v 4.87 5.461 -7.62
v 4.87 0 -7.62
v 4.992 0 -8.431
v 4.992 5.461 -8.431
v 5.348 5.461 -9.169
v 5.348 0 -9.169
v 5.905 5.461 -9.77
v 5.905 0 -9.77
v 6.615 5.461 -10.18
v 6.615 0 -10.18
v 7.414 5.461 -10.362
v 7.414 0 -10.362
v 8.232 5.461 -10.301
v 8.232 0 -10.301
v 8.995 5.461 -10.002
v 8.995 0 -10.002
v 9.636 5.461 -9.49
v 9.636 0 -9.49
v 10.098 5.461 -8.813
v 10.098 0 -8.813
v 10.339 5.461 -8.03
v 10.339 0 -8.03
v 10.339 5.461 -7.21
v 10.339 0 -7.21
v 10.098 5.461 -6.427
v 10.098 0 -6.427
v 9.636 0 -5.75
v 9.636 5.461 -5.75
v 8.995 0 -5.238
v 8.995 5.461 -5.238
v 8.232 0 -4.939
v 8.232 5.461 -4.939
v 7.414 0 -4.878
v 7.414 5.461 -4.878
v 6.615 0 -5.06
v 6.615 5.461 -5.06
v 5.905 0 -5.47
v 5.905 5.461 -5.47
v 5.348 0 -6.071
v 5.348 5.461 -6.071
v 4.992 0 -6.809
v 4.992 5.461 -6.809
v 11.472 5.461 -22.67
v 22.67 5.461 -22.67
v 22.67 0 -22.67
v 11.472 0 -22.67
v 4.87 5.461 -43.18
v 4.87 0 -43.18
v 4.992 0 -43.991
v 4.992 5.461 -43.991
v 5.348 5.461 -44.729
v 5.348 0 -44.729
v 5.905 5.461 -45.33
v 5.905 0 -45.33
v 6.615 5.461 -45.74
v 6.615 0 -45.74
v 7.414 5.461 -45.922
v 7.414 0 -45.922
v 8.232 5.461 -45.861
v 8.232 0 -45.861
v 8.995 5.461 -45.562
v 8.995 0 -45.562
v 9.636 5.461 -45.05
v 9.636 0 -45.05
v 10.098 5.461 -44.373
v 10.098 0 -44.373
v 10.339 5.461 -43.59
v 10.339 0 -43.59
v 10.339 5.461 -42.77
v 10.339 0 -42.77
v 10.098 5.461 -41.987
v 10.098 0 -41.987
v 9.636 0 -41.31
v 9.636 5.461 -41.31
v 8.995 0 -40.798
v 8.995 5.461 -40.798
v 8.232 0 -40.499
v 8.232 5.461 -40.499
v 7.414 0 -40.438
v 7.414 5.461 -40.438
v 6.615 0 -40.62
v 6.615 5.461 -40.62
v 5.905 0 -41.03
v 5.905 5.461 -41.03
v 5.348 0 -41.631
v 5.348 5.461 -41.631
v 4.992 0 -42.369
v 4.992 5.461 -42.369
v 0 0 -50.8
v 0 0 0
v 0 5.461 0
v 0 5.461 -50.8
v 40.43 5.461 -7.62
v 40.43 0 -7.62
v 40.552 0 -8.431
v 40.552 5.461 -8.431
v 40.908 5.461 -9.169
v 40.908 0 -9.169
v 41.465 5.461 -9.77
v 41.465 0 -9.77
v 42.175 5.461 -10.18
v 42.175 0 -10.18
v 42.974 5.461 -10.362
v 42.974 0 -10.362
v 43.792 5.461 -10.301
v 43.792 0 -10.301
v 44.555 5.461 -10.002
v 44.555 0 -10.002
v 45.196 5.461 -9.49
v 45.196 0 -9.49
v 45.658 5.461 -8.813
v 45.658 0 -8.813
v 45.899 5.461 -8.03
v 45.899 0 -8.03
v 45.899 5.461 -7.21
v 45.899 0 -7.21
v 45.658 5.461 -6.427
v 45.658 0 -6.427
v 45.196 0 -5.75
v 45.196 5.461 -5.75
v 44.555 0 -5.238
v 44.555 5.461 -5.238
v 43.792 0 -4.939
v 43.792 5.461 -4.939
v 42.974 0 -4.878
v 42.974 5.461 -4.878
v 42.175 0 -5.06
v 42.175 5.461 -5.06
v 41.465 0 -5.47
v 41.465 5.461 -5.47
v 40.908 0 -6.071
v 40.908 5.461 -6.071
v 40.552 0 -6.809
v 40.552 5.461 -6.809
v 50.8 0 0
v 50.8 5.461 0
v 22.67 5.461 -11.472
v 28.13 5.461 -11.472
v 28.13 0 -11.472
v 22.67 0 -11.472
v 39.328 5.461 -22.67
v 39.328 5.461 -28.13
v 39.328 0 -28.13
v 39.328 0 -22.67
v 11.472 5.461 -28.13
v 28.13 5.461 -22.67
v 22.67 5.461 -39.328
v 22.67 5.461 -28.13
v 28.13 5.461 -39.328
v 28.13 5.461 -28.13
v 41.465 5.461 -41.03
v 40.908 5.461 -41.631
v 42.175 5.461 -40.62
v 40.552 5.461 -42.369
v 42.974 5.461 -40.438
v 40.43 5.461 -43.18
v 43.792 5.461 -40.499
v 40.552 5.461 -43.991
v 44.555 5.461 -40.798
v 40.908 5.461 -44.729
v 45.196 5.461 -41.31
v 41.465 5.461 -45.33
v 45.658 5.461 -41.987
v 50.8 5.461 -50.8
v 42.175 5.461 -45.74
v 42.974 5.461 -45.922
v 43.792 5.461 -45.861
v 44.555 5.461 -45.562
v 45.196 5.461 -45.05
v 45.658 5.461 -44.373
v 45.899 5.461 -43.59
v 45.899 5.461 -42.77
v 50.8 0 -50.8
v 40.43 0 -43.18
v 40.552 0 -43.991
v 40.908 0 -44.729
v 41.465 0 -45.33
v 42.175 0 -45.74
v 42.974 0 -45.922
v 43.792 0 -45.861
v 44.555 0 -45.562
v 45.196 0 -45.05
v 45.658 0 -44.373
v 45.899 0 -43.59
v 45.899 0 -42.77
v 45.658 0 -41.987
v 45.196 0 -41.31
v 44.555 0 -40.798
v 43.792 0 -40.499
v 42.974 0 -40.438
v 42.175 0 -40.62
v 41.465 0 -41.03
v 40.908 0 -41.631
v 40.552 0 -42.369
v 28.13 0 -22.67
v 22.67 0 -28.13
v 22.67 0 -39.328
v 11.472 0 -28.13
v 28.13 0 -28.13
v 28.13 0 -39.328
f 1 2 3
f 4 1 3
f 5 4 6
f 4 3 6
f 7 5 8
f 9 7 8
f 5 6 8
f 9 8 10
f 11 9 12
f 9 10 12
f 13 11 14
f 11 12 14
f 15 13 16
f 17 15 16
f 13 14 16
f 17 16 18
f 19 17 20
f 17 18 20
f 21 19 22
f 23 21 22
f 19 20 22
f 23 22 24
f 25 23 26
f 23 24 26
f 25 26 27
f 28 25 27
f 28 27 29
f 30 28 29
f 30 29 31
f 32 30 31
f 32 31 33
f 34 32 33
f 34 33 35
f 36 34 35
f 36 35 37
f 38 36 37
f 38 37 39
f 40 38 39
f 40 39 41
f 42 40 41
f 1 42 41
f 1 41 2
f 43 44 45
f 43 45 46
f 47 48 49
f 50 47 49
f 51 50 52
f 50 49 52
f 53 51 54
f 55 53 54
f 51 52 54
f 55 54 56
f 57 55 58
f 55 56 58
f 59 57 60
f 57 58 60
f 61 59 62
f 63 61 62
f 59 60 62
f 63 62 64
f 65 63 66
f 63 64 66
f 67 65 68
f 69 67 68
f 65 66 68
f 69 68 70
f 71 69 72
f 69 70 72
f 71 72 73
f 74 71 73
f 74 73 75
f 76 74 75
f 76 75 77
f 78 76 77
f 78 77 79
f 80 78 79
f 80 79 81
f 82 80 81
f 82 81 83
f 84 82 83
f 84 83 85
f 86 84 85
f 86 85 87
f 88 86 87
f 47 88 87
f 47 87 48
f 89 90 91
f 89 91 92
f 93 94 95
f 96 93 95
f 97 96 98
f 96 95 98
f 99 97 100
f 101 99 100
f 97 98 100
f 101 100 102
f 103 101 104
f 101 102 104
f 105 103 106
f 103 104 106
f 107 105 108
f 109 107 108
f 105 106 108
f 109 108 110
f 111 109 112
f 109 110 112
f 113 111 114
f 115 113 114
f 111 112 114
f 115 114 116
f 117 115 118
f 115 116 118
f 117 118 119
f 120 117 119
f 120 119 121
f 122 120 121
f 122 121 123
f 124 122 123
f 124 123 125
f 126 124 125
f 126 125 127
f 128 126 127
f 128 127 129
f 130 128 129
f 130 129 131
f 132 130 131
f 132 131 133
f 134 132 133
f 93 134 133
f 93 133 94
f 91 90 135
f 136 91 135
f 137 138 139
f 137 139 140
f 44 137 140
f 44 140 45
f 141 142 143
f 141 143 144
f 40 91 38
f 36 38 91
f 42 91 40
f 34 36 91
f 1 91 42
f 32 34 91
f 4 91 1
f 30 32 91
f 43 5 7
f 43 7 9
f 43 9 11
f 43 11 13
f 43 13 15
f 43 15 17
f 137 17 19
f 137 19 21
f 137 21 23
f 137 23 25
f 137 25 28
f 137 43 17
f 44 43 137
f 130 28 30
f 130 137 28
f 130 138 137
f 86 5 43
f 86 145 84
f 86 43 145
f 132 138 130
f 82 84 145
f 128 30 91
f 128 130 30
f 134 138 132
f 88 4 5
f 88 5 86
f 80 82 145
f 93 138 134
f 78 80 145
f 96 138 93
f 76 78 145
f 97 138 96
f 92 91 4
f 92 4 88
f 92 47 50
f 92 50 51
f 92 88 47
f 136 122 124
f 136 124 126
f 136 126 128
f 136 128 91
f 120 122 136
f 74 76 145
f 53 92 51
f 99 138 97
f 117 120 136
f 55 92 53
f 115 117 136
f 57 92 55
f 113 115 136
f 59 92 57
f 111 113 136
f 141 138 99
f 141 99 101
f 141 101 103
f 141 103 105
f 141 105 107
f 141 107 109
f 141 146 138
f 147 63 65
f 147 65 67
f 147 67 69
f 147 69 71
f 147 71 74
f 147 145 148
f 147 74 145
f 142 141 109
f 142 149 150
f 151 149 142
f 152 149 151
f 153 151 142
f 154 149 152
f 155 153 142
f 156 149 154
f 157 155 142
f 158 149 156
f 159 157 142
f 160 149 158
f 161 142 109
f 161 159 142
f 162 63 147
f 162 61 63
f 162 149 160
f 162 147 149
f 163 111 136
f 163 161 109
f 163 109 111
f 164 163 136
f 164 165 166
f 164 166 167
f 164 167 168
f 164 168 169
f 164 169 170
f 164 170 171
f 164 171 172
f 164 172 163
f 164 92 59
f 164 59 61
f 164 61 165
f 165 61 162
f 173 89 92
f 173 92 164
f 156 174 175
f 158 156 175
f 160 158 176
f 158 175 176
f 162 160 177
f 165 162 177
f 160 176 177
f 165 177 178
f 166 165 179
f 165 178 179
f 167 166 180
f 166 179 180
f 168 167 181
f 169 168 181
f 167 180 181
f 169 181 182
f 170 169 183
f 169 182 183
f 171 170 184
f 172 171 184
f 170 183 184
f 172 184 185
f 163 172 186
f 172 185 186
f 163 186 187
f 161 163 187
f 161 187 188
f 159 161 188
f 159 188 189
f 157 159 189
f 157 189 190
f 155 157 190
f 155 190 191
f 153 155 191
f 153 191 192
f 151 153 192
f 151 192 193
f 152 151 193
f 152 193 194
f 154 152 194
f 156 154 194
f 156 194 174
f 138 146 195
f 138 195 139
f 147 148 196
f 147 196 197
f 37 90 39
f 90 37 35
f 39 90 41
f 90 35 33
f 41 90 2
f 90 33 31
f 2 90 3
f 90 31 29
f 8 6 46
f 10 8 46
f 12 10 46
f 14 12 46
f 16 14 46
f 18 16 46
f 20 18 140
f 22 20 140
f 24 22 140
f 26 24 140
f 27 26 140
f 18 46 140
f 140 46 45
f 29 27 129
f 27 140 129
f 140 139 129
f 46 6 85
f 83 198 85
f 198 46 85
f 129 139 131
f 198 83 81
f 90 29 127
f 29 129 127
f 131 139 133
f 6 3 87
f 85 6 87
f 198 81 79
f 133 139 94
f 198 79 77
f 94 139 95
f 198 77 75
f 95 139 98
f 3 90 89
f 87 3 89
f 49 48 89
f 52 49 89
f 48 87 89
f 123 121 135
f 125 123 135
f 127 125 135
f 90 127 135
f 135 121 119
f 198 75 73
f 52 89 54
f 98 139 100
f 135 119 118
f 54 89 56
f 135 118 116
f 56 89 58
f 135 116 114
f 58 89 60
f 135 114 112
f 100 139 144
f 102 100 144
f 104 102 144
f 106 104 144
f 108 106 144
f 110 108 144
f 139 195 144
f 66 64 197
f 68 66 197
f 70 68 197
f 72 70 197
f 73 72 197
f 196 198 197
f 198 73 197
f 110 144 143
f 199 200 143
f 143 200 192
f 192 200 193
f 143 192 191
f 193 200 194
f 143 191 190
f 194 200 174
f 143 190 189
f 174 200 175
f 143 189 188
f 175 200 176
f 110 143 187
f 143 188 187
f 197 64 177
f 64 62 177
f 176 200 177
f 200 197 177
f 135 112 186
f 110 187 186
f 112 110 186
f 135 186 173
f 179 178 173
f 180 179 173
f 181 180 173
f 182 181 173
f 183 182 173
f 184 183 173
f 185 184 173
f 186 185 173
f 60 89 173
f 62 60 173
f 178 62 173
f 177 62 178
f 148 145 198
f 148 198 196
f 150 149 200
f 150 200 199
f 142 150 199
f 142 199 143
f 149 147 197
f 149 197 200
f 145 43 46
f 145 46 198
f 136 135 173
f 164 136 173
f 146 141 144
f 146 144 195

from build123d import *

# Parameters (mm, degrees)
SKETCH1_W            = 50.8
SKETCH1_H            = 50.8
BOSS_EXTRUDE1_DEPTH  = 5.461
CUT_EXTRUDE1_DEPTH   = 5.461
M5_CLEARANCE_HOLE1_D = 5.5


with BuildPart() as part:
    # Sketch1 → Boss-Extrude1 (new body)
    with BuildSketch(Plane(origin=(0, 0, 0), x_dir=(1, 0, 0), z_dir=(0, 1, 0))):
        with Locations((25.4, 25.4)):
            Rectangle(SKETCH1_W, SKETCH1_H)
    extrude(amount=BOSS_EXTRUDE1_DEPTH)

    # Sketch2 → Cut-Extrude1 (cut)
    with BuildSketch(Plane(origin=(0, 5.461, 0), x_dir=(1, 0, 0), z_dir=(0, 1, 0))):
        Polygon((28.1305, 28.1305), (39.327666667, 28.1305), (39.327666667, 22.6695), (28.1305, 22.6695), (28.1305, 11.472333333), (22.6695, 11.472333333), (22.6695, 22.6695), (11.472333333, 22.6695), (11.472333333, 28.1305), (22.6695, 28.1305), (22.6695, 39.327666667), (28.1305, 39.327666667), align=None)
    extrude(amount=-CUT_EXTRUDE1_DEPTH, mode=Mode.SUBTRACT)

    # M5 Clearance Hole1 (through all)
    with Locations(Plane(origin=(0, 5.461, 0), x_dir=(1, 0, 0), z_dir=(0, 1, 0))):
        with Locations((7.62, 43.18), (43.18, 43.18), (43.18, 7.62), (7.62, 7.62)):
            Hole(M5_CLEARANCE_HOLE1_D / 2)


solid = part.part
